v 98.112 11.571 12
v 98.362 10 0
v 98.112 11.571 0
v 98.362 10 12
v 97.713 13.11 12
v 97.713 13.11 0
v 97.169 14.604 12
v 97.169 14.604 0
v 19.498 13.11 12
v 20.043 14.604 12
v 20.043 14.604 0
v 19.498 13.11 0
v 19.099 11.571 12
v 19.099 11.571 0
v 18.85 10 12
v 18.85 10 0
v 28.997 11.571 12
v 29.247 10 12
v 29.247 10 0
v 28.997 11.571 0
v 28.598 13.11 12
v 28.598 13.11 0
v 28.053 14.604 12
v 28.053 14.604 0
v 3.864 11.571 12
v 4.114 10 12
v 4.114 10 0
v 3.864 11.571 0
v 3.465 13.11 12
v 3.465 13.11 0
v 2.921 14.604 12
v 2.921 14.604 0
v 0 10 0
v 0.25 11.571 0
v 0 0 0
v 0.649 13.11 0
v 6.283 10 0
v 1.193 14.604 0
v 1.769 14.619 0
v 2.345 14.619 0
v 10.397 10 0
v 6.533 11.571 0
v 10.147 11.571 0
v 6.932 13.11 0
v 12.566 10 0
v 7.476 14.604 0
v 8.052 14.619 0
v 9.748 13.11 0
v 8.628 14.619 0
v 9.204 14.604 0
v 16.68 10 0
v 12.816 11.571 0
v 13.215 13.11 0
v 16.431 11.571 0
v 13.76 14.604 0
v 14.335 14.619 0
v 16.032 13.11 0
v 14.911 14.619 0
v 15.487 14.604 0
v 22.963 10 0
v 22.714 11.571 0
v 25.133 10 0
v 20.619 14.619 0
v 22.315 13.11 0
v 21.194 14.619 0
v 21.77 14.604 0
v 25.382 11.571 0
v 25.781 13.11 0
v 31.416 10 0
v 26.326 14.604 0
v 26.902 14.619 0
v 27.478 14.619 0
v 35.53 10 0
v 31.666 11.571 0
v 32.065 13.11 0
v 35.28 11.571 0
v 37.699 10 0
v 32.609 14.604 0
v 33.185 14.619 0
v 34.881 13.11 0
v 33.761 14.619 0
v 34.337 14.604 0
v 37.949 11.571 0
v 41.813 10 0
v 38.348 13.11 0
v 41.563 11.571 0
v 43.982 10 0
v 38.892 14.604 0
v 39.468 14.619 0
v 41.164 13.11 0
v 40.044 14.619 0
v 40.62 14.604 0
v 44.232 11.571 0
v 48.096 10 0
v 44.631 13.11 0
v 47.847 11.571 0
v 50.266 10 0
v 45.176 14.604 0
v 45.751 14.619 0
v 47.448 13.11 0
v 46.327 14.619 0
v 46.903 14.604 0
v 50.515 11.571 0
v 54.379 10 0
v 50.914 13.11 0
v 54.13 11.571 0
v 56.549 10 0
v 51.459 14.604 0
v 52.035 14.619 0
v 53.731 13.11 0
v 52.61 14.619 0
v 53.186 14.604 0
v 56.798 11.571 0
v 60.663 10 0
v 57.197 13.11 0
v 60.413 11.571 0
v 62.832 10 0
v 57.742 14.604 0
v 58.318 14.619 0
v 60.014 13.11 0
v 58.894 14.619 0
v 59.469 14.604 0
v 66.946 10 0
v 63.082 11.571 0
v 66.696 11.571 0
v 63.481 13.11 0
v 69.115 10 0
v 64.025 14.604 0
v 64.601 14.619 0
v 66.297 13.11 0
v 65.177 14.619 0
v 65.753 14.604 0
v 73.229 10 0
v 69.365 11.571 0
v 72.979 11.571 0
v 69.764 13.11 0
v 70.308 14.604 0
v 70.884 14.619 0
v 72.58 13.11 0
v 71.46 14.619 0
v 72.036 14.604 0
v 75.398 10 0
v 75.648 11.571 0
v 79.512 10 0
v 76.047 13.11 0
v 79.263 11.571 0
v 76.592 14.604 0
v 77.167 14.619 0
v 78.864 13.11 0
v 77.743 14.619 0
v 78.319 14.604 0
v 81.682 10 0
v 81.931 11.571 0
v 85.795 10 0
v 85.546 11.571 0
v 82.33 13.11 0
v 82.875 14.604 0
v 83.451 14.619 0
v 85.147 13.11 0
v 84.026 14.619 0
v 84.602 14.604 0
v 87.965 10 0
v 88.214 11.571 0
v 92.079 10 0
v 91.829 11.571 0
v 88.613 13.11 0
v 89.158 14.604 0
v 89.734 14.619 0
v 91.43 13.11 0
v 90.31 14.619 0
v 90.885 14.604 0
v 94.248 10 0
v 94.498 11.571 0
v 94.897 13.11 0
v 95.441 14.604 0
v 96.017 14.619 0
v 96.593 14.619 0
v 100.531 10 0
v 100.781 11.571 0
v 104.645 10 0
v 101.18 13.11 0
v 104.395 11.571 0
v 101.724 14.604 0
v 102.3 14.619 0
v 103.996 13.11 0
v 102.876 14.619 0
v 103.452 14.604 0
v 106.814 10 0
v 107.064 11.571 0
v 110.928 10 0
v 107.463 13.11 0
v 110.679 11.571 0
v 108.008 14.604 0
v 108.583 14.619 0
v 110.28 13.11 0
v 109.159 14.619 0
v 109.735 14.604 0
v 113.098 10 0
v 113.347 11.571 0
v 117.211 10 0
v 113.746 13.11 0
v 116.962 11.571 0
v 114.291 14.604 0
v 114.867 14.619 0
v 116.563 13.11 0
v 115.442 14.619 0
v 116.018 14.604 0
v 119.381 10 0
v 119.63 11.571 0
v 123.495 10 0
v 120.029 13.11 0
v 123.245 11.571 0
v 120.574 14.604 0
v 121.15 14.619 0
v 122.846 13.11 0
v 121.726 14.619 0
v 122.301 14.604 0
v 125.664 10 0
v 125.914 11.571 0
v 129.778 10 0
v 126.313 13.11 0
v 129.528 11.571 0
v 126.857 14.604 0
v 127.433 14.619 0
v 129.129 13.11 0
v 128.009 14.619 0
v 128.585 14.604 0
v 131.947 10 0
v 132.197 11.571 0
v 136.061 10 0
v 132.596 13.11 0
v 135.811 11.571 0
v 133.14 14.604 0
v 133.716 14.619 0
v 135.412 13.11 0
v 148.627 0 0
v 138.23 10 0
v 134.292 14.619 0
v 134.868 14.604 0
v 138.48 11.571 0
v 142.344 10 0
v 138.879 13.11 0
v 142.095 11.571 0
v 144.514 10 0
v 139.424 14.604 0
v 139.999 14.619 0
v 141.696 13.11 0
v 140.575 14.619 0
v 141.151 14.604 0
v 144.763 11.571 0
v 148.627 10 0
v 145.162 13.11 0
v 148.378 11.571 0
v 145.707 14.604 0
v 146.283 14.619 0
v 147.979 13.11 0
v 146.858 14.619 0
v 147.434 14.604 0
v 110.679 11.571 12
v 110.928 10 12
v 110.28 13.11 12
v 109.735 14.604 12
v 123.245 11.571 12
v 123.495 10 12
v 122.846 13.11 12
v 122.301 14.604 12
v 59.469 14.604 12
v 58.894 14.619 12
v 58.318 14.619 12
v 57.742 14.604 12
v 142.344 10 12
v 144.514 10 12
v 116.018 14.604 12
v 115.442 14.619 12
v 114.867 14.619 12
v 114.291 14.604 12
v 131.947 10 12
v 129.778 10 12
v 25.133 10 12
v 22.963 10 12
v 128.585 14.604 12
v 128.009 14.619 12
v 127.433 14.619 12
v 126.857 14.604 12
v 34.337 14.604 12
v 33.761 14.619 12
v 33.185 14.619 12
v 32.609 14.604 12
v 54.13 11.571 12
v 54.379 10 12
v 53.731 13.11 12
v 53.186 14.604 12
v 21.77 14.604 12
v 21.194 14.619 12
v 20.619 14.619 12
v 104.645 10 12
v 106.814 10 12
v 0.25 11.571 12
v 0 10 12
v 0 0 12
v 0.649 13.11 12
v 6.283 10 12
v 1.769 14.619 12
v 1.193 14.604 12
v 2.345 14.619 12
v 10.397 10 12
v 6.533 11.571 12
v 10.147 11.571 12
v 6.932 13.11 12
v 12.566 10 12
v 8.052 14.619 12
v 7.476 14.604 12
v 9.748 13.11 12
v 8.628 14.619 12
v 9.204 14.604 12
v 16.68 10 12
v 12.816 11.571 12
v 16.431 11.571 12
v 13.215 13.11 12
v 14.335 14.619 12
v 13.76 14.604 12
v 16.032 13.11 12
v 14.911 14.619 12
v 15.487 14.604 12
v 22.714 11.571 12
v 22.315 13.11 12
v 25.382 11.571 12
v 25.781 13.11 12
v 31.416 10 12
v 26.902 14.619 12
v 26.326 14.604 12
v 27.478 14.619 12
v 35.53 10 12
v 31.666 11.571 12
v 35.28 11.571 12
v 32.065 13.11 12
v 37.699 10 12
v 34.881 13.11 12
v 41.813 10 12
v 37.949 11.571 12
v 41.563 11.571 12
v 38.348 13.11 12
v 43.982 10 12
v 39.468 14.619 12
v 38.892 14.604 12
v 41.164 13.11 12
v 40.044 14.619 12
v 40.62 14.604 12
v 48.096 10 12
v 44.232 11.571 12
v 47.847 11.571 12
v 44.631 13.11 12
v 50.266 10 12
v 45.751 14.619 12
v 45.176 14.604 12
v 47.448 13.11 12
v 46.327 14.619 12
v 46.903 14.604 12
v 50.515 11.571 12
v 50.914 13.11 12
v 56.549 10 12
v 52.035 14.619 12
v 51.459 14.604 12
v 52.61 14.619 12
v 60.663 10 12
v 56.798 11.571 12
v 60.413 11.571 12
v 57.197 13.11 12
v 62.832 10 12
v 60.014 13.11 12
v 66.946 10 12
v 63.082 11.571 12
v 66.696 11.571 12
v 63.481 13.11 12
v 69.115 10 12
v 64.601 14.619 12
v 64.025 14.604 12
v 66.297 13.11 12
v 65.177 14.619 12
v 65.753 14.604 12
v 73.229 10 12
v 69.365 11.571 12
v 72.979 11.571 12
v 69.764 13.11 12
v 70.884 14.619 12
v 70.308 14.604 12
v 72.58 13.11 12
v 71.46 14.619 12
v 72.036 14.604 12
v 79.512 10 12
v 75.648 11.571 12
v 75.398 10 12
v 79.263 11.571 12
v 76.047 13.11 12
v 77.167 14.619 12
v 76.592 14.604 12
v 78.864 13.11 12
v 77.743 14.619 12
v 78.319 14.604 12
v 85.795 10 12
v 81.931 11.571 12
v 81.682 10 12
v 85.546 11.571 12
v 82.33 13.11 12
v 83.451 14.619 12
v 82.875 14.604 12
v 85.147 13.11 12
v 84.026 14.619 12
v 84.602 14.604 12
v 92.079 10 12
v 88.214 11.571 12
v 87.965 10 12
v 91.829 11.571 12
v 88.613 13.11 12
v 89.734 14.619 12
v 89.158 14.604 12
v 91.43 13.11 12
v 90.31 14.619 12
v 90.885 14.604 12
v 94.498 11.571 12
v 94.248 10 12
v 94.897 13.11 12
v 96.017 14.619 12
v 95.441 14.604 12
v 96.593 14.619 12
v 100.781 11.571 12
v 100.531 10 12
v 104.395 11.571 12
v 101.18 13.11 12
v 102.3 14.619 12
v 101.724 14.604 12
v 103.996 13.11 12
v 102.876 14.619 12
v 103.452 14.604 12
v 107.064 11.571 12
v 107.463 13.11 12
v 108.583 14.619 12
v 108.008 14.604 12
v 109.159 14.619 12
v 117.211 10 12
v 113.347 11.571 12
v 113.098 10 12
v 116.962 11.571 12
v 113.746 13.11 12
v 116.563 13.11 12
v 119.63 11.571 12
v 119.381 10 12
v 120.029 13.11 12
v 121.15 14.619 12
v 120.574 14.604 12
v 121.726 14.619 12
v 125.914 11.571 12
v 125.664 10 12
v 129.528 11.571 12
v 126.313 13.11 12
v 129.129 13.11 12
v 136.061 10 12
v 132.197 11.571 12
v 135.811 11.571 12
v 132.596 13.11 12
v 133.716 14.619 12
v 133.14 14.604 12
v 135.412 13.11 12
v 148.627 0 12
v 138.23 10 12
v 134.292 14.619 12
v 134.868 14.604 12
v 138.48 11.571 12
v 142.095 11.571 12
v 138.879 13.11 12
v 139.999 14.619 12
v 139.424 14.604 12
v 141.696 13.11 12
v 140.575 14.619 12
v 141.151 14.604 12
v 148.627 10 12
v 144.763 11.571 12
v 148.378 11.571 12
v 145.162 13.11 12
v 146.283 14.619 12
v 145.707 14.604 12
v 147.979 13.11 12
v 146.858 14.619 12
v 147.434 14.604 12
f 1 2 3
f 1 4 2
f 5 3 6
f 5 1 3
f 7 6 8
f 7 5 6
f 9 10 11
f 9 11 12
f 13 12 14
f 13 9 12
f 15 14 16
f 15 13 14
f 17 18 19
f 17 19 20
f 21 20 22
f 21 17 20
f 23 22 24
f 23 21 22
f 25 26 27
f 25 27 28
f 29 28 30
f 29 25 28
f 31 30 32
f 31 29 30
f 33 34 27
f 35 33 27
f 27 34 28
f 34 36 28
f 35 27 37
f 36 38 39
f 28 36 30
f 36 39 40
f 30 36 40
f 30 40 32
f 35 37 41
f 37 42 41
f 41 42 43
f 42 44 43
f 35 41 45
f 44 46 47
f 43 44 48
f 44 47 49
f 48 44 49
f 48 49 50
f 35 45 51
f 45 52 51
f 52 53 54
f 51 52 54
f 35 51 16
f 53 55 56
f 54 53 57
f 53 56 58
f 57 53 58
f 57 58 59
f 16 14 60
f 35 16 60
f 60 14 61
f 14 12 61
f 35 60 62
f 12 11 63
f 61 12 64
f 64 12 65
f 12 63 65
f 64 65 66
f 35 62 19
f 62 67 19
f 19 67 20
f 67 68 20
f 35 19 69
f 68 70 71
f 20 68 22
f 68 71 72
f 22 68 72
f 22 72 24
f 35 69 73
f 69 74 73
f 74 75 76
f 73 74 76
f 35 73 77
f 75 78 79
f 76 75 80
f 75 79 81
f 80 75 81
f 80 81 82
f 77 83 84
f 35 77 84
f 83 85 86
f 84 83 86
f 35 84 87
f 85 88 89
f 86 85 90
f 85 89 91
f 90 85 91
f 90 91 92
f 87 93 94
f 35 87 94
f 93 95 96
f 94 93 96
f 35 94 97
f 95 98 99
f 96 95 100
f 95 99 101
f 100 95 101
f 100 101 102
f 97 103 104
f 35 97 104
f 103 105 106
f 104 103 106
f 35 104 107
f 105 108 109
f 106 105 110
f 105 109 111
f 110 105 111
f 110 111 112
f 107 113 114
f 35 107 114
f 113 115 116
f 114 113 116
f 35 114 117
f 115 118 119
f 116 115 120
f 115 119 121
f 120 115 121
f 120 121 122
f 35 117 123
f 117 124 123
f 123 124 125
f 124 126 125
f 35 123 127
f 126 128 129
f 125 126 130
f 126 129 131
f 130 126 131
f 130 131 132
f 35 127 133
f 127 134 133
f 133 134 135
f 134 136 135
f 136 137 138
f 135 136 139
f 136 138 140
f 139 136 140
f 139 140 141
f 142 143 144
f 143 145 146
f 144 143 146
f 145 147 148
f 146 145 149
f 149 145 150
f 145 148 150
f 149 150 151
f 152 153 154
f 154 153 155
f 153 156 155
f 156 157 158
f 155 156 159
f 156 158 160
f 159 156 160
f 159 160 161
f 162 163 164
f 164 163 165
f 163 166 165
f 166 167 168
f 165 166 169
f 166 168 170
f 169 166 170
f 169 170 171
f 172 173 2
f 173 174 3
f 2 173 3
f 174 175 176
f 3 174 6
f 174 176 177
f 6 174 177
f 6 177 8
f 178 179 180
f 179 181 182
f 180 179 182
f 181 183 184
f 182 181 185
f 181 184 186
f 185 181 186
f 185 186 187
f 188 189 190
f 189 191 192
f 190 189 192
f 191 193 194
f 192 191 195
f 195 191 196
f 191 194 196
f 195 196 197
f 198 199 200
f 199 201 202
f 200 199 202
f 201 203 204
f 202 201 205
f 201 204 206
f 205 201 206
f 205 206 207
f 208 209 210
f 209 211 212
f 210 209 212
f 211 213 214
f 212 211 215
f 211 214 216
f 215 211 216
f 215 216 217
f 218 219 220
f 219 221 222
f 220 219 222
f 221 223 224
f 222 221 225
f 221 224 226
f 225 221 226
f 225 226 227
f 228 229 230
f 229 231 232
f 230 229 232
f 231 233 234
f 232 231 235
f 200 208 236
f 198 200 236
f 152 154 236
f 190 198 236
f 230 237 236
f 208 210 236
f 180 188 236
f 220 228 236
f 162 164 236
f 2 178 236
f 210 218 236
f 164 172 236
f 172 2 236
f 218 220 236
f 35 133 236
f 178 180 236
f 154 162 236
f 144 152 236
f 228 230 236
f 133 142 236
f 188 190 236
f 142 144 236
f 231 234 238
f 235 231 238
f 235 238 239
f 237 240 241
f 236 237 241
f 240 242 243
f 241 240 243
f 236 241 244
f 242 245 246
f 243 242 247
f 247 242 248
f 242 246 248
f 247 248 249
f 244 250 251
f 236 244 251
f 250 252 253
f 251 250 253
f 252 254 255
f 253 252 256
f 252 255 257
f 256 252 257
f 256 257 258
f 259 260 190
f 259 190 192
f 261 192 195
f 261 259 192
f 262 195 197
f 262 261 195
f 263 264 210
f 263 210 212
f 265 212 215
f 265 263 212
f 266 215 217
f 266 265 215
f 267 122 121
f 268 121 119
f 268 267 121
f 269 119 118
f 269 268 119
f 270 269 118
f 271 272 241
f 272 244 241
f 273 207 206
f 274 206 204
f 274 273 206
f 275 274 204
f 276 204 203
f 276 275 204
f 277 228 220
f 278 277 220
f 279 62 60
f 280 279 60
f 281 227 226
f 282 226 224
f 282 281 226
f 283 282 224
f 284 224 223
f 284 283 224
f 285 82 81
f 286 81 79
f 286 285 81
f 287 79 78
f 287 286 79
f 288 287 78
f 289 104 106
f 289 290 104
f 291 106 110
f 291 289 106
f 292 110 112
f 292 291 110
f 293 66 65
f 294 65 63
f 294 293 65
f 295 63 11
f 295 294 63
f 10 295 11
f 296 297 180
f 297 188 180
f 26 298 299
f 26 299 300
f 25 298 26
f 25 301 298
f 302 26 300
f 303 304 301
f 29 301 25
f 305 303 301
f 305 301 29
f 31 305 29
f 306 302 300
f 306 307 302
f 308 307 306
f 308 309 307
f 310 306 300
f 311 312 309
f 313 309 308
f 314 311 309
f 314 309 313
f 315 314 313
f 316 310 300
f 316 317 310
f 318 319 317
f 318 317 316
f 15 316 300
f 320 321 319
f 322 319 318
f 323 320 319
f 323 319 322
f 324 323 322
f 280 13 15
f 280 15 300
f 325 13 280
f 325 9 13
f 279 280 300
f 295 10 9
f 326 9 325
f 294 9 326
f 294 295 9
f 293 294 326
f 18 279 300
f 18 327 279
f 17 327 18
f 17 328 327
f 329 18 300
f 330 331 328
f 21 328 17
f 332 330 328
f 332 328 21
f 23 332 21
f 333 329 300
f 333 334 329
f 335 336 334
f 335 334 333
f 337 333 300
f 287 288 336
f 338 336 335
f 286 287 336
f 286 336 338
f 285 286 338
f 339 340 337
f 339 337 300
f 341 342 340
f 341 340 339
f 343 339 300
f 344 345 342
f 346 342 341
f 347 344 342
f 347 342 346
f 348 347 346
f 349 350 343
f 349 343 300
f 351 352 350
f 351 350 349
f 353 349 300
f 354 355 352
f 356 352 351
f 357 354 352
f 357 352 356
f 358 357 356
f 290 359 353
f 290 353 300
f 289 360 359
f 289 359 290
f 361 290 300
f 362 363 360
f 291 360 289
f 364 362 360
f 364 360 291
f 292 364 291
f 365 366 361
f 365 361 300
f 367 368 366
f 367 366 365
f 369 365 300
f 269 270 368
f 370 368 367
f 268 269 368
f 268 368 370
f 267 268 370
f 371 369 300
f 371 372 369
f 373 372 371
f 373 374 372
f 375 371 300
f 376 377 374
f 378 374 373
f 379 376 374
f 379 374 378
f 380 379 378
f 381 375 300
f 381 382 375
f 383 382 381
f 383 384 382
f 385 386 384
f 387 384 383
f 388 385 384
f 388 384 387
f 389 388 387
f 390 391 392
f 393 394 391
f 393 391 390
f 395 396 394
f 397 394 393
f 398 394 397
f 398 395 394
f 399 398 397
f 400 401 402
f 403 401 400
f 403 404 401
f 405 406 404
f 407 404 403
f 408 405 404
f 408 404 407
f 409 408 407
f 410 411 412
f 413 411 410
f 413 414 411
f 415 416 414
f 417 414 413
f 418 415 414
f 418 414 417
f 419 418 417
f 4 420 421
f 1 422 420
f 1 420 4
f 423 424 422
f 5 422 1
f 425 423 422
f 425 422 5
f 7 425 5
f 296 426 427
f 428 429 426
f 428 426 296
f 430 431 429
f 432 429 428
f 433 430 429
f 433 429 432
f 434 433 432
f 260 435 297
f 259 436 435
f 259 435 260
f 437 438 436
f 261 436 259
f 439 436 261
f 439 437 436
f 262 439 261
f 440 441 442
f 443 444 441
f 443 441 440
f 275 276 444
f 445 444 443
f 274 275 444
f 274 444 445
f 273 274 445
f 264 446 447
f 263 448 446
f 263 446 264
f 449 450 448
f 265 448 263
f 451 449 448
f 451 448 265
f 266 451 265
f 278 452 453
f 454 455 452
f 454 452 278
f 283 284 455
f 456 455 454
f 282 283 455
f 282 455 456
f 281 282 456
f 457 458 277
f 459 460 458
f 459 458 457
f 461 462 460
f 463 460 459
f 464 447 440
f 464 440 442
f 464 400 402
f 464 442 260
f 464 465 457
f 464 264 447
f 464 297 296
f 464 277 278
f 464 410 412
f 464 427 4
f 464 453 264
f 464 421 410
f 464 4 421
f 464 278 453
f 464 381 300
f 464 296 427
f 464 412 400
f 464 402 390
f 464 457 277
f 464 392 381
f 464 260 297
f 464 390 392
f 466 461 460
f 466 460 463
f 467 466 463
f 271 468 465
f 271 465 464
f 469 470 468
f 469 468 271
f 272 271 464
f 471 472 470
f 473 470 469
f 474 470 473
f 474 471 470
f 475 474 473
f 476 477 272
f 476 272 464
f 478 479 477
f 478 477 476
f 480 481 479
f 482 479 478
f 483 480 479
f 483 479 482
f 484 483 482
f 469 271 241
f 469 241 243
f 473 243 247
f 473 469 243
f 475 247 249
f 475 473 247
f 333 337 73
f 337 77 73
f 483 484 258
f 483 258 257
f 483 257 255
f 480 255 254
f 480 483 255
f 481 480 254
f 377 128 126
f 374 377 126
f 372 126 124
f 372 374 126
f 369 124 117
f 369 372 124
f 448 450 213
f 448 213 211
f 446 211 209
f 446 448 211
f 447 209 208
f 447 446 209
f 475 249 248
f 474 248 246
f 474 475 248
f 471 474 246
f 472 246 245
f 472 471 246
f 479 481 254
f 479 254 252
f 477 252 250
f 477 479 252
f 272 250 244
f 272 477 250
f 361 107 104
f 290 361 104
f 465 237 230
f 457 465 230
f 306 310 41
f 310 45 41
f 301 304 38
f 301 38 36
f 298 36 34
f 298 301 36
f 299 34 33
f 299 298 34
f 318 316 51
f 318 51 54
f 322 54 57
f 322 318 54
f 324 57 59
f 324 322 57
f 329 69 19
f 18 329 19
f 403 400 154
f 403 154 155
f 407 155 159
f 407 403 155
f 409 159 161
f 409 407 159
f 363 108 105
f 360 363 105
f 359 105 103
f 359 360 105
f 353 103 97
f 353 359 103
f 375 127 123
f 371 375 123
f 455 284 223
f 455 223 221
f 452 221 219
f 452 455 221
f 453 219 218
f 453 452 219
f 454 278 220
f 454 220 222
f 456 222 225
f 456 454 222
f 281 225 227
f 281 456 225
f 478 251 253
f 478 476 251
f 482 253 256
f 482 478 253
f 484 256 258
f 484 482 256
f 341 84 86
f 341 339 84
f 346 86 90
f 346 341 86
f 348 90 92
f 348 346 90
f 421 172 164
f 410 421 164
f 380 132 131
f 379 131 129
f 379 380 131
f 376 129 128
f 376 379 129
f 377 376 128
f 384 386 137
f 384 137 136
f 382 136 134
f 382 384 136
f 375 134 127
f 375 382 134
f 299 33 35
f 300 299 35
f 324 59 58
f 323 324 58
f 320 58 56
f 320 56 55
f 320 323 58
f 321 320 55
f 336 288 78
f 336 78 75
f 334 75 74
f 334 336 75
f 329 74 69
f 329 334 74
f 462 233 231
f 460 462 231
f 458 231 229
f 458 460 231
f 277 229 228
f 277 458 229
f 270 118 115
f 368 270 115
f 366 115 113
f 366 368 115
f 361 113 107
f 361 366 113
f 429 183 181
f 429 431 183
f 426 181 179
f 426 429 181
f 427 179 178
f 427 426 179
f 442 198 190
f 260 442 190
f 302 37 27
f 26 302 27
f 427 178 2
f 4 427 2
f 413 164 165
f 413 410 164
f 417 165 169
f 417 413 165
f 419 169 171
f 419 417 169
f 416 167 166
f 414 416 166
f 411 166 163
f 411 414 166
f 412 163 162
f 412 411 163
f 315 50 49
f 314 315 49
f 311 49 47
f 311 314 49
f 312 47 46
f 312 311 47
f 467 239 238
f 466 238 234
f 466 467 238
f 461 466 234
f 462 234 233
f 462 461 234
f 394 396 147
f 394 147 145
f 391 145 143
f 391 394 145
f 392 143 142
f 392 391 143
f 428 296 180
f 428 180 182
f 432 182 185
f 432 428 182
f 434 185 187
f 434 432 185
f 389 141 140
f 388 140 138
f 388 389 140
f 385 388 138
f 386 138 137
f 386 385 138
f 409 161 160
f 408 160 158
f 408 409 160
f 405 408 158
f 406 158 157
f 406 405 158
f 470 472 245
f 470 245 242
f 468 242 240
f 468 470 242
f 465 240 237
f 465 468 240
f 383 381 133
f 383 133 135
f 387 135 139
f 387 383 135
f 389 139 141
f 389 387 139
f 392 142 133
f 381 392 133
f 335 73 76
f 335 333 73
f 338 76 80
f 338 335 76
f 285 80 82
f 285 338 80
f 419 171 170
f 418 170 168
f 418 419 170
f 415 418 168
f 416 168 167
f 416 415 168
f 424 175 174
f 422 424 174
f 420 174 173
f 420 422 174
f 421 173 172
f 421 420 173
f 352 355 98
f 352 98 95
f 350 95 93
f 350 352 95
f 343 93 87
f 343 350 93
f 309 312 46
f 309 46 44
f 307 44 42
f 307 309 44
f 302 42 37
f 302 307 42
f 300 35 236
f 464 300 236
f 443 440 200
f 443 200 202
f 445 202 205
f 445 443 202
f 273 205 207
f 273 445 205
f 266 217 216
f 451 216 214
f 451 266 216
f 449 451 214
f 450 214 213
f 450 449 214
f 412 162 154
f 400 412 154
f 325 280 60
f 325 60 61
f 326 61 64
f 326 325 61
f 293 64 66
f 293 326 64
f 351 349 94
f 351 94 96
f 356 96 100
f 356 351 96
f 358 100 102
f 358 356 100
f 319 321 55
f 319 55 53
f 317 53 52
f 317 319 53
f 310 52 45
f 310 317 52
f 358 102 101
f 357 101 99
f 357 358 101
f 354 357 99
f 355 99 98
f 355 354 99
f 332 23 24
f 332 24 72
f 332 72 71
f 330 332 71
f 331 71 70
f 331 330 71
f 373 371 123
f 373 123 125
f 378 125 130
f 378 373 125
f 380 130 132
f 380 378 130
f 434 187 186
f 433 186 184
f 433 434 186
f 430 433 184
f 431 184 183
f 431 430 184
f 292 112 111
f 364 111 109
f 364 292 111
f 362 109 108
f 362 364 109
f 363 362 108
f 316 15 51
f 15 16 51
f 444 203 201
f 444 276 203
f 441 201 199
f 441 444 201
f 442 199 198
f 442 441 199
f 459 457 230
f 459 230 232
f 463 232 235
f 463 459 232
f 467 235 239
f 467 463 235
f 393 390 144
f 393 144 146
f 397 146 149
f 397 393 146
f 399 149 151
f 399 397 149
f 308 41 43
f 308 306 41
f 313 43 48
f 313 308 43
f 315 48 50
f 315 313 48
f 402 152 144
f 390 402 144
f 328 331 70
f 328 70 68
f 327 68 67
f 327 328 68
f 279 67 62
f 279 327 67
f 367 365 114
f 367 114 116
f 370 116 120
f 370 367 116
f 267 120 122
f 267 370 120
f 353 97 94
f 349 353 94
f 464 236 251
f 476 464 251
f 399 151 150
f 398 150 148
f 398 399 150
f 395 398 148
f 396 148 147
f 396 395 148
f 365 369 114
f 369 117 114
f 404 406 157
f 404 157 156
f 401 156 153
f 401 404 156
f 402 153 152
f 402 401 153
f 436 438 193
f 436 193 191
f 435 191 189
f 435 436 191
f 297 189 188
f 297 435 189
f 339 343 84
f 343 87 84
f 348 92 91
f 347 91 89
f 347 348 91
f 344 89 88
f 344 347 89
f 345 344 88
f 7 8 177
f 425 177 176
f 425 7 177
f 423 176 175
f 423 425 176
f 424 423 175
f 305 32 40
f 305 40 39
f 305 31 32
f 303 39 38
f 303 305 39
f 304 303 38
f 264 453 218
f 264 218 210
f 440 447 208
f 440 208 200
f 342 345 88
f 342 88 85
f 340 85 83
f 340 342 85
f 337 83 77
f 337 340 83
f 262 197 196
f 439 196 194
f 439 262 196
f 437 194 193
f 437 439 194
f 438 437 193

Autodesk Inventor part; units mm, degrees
ref_plane "YZ Plane" through (0, 0, 0) normal (1, 0, 0) x (0, 1, 0)
ref_plane "XZ Plane" through (0, 0, 0) normal (0, 1, 0) x (-1, 0, 0)
ref_plane "XY Plane" through (0, 0, 0) normal (0, 0, 1) x (1, 0, 0)
sketch "Sketch1" plane through (0, 0, 0) normal (0, 0, 1) x (1, 0, 0)
  line L0 (0, 0) -> (148.627, 0)
  line L1 (148.627, 0) -> (148.627, 10)
  line L2 (148.627, 10) -> (0, 10)
  line L3 (0, 10) -> (0, 0)
  dimension "d0" = 148.627
  dimension "d1" = 10
extrude "Extrusion1" add sketch "Sketch1" along normal blind 12
sketch "Sketch2" plane through (0, 0, 12) normal (0, 0, 1) x (1, 0, 0)
  arc A0 (4.1138, 10) -> (2.9206, 14.6043) centre (-12.3652, 8.1863) ccw
  arc A1 (2.9206, 14.6043) -> (1.1932, 14.6043) centre (2.0569, -7.3787) ccw
  arc A2 (1.1932, 14.6043) -> (0, 10) centre (16.479, 8.1863) ccw
  line L0 (0, 0) -> (148.627, 0) projected
  line L1 (148.627, 0) -> (148.627, 10) projected
  line L2 (148.627, 10) -> (0, 10) projected
  line L3 (0, 10) -> (0, 0) projected
  line L4 (148.627, 10) -> (0, 10) projected
  line L5 (0, 10) -> (4.1138, 10)
  dimension "d4" = 16.5785
  dimension "d5" = 16.5785
  dimension "d6" = 22
  dimension "d7" = 28.8442
  dimension "d8" = 1.1932
  dimension "d9" = 6.418
  dimension "d10" = 4.6043
  dimension "d11" = 1.1932
extrude "Extrusion2" add sketch "Sketch2" against normal blind 12 contours L2 A2 A1 A0
pattern_linear "Rectangular Pattern1" count 24 spacing 6.2832 along (1, 0, 0) of "Extrusion2"
properties part number "Cremallera"
